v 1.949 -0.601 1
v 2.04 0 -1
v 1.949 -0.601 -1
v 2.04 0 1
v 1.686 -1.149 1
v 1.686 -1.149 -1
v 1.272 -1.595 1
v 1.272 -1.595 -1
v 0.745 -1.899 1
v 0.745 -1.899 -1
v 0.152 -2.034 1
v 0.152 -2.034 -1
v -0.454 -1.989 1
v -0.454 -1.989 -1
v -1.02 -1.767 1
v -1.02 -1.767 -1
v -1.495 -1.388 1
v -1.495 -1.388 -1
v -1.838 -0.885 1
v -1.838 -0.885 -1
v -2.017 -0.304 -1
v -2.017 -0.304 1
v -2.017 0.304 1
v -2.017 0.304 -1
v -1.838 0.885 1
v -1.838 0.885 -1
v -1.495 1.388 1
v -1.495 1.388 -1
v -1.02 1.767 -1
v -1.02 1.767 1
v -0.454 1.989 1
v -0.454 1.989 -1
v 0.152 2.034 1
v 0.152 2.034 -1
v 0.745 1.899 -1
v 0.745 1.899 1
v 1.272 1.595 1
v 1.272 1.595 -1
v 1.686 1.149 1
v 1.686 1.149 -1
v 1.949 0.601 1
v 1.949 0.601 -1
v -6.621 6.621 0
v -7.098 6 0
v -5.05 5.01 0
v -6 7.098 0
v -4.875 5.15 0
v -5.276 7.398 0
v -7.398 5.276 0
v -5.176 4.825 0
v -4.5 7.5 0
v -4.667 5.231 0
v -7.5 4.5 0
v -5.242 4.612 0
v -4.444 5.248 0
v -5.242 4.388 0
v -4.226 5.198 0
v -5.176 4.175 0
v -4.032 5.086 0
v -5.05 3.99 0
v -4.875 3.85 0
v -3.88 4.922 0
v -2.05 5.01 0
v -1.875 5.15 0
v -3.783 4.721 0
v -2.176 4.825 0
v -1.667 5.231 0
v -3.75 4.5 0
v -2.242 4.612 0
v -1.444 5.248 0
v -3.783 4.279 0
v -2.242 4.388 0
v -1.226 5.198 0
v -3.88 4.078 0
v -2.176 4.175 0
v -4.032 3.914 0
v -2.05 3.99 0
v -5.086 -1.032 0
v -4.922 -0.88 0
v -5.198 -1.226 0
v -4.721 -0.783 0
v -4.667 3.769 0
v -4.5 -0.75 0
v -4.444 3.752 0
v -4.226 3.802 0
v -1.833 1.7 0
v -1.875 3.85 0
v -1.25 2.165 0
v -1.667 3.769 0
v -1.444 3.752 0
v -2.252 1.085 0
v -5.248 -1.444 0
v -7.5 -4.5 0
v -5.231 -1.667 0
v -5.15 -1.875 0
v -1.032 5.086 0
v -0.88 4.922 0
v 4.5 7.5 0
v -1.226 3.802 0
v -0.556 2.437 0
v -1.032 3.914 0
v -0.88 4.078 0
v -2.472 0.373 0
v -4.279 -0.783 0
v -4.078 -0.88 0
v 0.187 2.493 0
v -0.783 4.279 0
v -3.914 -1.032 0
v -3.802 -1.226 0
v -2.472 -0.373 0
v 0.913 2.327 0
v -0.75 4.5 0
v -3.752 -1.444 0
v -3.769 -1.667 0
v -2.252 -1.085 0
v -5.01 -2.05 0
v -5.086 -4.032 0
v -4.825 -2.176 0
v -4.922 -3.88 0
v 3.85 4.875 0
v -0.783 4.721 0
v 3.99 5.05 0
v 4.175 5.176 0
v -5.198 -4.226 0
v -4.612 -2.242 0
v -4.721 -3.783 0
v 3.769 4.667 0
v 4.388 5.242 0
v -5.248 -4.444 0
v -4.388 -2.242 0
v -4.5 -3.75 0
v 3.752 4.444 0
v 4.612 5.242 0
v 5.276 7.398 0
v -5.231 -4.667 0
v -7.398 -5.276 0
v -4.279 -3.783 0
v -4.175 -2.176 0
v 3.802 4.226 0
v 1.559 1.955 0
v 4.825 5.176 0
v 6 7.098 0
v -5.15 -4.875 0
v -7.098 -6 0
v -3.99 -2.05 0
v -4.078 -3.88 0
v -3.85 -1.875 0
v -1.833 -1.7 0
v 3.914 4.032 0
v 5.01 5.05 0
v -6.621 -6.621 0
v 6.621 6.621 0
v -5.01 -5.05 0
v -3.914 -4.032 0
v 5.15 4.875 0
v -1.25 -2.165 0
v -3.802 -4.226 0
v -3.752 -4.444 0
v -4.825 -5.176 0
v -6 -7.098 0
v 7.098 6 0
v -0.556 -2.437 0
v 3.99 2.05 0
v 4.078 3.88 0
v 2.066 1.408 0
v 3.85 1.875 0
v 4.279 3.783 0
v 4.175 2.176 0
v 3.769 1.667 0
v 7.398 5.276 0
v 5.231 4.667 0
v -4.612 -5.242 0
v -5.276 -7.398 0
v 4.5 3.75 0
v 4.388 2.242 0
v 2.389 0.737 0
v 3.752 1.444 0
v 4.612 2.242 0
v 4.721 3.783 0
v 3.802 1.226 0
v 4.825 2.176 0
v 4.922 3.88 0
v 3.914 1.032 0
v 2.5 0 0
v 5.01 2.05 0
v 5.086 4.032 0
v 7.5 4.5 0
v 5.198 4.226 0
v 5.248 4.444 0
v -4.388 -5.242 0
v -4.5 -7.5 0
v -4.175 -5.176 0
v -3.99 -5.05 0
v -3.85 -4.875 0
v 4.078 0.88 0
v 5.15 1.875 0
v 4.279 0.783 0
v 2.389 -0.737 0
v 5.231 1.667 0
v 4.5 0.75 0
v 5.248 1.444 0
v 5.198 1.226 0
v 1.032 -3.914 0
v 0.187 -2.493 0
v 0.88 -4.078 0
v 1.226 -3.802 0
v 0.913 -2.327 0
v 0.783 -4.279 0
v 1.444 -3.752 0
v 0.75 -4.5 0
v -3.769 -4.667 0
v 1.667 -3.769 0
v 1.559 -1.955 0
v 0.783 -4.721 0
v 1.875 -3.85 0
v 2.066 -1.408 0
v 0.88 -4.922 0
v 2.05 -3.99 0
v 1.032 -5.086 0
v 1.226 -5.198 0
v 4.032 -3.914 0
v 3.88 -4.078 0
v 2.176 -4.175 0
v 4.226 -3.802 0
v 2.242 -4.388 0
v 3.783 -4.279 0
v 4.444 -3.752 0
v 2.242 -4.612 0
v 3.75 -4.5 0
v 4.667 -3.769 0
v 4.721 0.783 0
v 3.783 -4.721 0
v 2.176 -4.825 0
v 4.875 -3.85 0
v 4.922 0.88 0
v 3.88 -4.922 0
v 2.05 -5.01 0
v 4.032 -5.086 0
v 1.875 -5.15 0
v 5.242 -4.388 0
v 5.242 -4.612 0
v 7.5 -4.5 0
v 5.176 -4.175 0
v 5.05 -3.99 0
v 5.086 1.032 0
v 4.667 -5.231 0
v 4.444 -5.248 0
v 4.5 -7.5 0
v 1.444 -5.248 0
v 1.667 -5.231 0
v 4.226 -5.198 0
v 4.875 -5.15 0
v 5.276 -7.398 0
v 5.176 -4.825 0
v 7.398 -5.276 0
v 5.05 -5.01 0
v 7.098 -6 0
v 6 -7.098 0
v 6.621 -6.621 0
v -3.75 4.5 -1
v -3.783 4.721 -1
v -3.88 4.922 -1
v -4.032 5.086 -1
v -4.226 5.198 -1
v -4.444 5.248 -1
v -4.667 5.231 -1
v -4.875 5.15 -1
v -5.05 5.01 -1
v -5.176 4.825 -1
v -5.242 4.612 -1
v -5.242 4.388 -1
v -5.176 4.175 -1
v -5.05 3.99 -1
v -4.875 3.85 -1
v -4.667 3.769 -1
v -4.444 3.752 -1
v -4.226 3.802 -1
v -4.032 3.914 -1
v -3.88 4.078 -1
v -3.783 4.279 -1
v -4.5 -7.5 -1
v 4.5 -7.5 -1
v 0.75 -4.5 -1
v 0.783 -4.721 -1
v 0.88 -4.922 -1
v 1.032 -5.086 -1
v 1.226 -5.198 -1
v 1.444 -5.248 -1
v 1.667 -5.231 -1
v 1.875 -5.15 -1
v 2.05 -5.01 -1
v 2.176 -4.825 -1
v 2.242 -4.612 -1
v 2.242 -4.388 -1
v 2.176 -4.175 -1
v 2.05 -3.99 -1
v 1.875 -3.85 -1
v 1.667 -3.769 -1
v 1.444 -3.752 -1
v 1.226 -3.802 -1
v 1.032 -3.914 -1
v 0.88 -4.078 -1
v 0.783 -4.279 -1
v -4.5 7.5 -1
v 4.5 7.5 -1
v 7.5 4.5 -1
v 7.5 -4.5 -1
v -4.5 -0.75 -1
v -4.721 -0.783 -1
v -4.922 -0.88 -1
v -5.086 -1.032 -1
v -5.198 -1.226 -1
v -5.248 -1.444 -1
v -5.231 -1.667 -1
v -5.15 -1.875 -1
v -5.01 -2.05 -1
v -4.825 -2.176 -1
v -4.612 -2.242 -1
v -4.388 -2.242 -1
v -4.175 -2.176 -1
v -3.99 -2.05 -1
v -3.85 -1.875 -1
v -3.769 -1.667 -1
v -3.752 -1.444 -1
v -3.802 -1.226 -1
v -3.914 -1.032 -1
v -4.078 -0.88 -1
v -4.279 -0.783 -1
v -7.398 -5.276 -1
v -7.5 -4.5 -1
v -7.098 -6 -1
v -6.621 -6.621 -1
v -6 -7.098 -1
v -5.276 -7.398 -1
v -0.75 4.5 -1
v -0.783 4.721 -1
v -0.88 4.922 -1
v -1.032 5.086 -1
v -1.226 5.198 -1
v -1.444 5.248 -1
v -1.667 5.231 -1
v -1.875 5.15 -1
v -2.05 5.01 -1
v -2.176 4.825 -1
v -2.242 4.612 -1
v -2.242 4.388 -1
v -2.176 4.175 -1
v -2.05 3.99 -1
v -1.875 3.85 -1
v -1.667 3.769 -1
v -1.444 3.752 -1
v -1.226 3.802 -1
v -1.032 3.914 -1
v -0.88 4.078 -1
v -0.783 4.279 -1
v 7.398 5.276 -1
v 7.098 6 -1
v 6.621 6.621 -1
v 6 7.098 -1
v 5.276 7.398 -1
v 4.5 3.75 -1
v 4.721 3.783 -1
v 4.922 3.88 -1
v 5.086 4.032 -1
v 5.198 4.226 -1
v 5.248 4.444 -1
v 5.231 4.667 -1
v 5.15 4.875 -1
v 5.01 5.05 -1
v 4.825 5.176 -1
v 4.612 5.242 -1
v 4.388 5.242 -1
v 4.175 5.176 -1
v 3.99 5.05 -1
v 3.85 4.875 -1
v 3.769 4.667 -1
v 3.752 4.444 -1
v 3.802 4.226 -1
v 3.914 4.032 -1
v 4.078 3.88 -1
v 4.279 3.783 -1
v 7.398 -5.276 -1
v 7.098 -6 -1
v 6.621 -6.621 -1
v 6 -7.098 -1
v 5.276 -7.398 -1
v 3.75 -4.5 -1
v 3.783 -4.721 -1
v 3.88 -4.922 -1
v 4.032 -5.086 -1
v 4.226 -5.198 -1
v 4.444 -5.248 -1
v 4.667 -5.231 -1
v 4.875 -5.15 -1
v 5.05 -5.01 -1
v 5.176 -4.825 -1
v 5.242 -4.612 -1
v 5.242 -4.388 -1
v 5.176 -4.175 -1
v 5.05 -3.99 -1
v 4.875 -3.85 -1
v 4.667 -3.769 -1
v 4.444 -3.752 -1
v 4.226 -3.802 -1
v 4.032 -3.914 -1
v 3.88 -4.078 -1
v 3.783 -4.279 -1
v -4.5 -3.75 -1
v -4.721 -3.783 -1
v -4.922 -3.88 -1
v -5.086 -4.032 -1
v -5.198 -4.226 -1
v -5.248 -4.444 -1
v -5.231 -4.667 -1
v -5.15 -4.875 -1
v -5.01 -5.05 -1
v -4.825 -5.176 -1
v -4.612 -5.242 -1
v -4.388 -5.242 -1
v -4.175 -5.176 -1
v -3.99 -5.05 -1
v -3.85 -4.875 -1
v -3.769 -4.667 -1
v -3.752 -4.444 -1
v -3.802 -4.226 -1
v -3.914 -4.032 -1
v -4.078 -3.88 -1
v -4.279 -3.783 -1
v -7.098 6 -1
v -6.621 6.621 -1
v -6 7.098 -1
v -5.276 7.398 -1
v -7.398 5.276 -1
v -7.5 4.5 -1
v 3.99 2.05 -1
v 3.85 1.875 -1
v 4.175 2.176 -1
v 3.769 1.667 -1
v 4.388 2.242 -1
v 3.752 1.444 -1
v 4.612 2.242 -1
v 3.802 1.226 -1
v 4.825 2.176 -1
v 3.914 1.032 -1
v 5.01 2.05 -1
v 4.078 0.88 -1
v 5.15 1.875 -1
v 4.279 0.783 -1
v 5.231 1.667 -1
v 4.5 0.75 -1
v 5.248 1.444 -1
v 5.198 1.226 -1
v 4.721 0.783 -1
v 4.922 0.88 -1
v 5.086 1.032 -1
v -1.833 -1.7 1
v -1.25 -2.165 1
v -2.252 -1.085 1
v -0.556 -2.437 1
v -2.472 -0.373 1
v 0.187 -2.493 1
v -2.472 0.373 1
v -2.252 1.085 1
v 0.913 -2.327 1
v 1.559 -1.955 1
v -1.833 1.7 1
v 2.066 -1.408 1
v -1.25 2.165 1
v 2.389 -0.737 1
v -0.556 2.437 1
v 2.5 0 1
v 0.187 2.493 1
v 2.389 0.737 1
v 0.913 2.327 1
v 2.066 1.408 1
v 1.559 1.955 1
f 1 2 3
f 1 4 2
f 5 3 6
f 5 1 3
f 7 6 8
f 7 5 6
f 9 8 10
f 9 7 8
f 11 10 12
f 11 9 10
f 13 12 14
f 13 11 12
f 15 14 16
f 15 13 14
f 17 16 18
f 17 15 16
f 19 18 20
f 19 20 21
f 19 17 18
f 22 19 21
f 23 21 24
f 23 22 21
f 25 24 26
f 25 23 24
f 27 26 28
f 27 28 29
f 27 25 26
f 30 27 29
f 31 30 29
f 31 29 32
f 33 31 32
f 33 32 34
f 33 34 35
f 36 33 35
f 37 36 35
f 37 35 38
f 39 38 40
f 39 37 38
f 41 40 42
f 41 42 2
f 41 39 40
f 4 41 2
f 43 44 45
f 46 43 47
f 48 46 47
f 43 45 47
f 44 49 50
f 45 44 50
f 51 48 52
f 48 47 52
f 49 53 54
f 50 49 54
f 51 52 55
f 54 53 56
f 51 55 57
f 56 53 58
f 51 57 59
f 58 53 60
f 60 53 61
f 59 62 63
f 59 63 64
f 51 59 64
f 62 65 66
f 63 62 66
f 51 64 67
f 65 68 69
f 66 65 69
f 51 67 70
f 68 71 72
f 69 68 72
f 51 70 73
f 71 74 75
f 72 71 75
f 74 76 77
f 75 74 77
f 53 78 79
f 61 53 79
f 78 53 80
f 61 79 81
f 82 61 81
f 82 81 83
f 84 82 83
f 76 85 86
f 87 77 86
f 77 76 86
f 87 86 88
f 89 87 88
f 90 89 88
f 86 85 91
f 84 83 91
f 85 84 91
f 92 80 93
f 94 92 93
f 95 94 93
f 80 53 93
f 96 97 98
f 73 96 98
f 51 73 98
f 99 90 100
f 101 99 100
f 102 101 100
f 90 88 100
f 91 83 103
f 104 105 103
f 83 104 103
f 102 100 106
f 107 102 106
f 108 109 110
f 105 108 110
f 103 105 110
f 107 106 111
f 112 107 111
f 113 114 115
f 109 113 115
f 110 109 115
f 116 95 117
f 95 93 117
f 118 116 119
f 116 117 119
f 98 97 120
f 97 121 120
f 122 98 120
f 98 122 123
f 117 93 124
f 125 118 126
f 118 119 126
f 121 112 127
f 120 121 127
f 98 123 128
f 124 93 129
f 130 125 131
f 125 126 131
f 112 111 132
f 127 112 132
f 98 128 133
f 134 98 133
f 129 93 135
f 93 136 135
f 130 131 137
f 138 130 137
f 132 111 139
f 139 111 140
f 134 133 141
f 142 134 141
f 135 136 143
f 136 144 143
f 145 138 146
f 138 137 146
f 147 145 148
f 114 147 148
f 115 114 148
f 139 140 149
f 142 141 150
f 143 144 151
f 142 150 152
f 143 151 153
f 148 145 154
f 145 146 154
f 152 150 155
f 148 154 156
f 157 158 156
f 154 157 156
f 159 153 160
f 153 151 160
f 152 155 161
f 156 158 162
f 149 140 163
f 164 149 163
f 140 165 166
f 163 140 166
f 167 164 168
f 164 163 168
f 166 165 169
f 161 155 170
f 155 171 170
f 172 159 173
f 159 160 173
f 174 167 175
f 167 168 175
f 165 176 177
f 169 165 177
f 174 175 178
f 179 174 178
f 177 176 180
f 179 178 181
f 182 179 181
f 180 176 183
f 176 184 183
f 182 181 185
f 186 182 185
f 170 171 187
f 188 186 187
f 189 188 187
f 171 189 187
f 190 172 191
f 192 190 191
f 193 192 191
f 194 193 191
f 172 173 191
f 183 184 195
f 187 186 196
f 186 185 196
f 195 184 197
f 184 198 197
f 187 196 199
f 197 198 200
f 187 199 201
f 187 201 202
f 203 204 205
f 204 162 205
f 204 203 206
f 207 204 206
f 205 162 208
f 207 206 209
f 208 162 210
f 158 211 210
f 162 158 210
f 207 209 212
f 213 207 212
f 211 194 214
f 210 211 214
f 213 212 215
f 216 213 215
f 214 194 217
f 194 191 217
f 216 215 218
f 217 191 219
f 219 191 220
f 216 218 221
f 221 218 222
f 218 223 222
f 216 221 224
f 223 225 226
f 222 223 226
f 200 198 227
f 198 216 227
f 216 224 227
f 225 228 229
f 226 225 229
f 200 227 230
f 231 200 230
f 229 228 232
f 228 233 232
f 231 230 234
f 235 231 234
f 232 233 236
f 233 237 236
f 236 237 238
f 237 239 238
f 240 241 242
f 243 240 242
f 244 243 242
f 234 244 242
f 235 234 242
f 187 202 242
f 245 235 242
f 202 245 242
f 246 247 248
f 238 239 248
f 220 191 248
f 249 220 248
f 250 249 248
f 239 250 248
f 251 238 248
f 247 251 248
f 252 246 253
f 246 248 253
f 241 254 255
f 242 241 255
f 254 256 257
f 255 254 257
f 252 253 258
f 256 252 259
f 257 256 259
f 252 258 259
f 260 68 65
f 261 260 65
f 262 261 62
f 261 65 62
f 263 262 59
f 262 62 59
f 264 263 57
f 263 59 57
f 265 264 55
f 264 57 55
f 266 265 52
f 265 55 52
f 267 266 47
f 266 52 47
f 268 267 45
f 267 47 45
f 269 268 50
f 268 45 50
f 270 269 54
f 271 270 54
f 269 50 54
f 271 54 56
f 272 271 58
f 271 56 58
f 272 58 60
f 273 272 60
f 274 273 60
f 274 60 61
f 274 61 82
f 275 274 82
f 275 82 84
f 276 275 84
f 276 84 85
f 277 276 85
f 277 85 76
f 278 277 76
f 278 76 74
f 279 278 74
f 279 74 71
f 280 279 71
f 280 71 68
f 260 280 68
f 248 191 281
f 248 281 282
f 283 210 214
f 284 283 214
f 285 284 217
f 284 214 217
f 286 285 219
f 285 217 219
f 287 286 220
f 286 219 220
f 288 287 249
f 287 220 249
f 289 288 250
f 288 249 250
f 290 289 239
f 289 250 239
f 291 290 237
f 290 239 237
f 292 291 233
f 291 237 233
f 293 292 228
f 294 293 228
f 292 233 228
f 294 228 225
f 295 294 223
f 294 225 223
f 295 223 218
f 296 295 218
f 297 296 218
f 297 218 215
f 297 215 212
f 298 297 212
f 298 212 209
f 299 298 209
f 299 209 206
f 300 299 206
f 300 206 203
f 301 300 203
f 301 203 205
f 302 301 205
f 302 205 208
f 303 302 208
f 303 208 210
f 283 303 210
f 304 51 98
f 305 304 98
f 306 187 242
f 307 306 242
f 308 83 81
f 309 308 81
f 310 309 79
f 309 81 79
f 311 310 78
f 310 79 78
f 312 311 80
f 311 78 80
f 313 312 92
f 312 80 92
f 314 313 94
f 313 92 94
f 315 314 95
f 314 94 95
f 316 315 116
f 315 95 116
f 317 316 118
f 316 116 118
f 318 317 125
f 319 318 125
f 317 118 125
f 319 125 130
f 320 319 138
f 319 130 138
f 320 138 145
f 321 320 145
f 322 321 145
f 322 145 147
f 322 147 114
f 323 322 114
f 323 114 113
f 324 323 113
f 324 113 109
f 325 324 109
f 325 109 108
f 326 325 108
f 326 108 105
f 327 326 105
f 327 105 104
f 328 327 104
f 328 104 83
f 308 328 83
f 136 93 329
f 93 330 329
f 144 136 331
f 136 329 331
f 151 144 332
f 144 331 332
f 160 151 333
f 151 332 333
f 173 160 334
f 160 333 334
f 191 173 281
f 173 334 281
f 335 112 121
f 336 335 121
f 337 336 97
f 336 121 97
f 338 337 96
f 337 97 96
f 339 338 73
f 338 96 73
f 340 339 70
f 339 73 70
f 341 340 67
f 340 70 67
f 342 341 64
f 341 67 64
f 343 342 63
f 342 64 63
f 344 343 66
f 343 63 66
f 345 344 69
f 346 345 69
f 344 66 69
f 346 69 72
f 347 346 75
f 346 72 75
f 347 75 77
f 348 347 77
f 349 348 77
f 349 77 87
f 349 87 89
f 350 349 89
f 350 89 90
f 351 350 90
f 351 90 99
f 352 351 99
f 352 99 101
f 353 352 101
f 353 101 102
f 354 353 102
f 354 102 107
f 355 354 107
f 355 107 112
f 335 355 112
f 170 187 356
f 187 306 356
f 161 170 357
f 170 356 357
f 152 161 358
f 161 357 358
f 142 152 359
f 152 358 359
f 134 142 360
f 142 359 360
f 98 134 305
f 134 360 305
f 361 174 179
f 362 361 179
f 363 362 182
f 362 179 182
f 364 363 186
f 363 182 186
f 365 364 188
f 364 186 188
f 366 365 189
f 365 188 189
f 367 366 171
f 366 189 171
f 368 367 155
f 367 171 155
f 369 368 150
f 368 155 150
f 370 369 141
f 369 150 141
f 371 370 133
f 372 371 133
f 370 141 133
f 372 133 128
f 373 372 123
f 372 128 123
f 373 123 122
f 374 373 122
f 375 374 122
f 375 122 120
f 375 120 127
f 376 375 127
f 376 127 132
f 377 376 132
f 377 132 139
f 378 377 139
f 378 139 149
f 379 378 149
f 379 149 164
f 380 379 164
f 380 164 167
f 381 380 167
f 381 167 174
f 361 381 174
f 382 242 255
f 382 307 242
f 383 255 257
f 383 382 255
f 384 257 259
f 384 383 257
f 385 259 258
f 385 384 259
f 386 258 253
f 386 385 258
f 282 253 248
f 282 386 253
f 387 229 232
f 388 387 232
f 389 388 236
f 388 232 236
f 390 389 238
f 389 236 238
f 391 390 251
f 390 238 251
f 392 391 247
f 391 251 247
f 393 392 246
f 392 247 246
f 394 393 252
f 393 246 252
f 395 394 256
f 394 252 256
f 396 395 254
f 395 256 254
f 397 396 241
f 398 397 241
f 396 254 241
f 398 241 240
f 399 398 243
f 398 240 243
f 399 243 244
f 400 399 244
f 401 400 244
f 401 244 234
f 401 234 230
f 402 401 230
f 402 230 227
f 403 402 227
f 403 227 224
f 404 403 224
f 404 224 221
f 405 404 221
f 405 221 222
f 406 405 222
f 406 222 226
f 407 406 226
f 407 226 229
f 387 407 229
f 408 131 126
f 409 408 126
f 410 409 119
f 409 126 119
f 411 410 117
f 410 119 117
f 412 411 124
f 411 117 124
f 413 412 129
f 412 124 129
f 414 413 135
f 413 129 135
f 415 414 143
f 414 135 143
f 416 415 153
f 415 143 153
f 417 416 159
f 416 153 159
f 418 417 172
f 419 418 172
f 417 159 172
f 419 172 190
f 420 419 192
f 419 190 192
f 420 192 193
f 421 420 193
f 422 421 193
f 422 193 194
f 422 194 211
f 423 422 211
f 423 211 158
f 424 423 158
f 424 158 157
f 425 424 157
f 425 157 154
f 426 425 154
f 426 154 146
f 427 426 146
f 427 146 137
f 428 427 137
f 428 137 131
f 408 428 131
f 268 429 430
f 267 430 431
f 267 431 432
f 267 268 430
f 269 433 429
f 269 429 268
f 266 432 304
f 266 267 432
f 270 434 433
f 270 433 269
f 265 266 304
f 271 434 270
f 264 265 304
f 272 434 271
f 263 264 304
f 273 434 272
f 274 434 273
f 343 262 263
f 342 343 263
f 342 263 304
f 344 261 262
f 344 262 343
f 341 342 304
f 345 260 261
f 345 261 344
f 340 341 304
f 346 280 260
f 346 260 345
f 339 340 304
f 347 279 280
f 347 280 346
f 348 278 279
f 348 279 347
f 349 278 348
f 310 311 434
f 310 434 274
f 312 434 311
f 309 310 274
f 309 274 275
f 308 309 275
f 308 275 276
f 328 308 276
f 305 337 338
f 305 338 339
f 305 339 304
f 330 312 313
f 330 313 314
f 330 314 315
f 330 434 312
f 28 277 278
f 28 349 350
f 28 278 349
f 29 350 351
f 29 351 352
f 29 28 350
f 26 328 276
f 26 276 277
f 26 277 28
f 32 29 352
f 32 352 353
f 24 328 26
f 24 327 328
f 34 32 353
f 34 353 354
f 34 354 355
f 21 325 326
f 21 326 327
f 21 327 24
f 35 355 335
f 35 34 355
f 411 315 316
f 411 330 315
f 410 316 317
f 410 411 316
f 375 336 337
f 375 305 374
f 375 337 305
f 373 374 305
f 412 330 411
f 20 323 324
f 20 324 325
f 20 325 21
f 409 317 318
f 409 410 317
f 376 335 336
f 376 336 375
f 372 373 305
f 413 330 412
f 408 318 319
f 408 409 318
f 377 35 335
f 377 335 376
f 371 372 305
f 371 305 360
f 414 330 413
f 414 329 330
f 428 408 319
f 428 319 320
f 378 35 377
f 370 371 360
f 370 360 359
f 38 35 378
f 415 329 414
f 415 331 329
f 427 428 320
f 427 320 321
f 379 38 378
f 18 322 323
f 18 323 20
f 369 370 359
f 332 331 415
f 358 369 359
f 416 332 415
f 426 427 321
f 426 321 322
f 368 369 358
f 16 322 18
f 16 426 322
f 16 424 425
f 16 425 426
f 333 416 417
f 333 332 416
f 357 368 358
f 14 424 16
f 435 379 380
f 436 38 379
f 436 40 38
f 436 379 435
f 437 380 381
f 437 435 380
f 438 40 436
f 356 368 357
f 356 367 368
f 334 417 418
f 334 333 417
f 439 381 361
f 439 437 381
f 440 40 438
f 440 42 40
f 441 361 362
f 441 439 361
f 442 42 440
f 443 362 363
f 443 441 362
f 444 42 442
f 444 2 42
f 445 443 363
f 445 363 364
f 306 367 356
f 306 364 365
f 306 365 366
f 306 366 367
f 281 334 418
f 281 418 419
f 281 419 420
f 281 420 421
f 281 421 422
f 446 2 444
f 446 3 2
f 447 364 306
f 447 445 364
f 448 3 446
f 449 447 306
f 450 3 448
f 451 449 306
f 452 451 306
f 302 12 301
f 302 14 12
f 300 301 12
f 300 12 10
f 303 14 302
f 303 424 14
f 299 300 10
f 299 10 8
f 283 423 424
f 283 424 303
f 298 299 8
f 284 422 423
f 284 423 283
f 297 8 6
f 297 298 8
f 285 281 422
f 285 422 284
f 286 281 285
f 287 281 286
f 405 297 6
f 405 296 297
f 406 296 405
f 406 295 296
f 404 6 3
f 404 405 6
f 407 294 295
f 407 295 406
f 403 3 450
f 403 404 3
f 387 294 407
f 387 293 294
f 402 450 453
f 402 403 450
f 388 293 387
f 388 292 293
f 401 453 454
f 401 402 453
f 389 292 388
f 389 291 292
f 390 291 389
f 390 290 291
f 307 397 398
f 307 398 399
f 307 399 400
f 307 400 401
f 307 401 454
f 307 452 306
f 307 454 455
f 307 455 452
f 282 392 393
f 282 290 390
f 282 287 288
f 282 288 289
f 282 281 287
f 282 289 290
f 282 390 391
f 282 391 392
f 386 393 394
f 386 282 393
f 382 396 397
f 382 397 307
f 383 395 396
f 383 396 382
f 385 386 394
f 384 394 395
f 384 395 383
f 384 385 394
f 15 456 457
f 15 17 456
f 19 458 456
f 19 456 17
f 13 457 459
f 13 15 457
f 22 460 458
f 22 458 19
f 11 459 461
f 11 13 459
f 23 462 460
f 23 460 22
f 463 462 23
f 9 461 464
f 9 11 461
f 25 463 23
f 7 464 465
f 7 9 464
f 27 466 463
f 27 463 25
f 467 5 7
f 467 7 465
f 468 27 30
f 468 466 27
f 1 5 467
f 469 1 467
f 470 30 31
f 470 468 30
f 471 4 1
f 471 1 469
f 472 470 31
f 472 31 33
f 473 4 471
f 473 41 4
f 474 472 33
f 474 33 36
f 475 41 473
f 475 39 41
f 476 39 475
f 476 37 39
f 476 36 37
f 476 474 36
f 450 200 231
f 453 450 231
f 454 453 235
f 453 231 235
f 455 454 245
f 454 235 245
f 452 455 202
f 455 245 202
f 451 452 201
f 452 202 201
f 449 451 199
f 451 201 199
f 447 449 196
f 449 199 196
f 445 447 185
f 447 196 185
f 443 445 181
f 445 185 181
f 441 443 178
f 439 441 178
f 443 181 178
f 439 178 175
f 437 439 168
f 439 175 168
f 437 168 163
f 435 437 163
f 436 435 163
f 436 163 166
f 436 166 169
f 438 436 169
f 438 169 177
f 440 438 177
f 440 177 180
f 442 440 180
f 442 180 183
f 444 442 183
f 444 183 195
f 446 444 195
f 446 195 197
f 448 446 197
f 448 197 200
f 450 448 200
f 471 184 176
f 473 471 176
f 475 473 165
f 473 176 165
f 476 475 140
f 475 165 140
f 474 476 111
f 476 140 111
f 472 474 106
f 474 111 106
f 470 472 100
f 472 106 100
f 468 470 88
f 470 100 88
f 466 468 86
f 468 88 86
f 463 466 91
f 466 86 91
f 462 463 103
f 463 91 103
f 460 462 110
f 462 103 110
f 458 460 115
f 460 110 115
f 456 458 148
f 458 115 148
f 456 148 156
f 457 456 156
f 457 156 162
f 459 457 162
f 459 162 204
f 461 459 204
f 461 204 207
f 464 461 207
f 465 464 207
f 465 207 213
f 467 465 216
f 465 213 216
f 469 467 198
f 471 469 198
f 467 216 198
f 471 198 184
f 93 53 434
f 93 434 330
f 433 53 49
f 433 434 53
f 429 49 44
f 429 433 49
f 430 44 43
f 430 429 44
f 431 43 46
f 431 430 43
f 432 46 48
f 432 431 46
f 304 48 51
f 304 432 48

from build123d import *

# Parameters (mm, degrees)
F0_R            = 2.5
F0_R_2          = 2.04
F1_DEPTH        = 1
F2_W            = 15
F2_H            = 15
F2_R            = 5
F2_R_2          = 2.5
F2_R_3          = 2.04
F3_DEPTH        = 1
F4_R            = 3
F5_R            = 0.75
F6_DEPTH        = 25
F6_COPIES_COUNT = 4


# Not quite as in the source:
# - a pattern or mirror of a feature is missing from the dataset's text; its kind, count and spacing are read off the source's solid


with BuildPart() as f1:
    # F0 (on Top) → F1 (new body)
    with BuildSketch(Plane.XY):
        Circle(F0_R)
        Circle(F0_R_2, mode=Mode.SUBTRACT)
    extrude(amount=F1_DEPTH)

    # F2 (on face) → F3 (join)
    with BuildSketch(Plane(origin=(0, 0, 0), x_dir=(1, 0, 0), z_dir=(0, 0, -1))):
        Rectangle(F2_W, F2_H)
        Circle(F2_R, mode=Mode.SUBTRACT)
        Circle(F2_R)
        Circle(F2_R_2, mode=Mode.SUBTRACT)
        Circle(F2_R_2)
        Circle(F2_R_3, mode=Mode.SUBTRACT)
    extrude(amount=F3_DEPTH)

    # F4
    f4_edges = [f1.edges().sort_by_distance(p)[0] for p in [
        (-7.5, 7.5, -0.5),
        (7.5, 7.5, -0.5),
        (-7.5, -7.5, -0.5),
        (7.5, -7.5, -0.5),
    ]]
    fillet(f4_edges, radius=F4_R)

    # F5 (on face) → F6 (cut)
    with BuildSketch(Plane.XY):
        with Locations((-4.5, 4.5)):
            Circle(F5_R)
        with Locations((-1.5, 4.5)):
            Circle(F5_R)
    f6 = extrude(amount=-F6_DEPTH, mode=Mode.SUBTRACT)

    # F6_copies: F6 ×4 about axis
    f6_copies_axis = Axis((0, 0, 0), (0, 0, 1))
    for i in range(1, F6_COPIES_COUNT):
        add(f6.rotate(f6_copies_axis, i * 360 / F6_COPIES_COUNT), mode=Mode.SUBTRACT)


solid = f1.part
